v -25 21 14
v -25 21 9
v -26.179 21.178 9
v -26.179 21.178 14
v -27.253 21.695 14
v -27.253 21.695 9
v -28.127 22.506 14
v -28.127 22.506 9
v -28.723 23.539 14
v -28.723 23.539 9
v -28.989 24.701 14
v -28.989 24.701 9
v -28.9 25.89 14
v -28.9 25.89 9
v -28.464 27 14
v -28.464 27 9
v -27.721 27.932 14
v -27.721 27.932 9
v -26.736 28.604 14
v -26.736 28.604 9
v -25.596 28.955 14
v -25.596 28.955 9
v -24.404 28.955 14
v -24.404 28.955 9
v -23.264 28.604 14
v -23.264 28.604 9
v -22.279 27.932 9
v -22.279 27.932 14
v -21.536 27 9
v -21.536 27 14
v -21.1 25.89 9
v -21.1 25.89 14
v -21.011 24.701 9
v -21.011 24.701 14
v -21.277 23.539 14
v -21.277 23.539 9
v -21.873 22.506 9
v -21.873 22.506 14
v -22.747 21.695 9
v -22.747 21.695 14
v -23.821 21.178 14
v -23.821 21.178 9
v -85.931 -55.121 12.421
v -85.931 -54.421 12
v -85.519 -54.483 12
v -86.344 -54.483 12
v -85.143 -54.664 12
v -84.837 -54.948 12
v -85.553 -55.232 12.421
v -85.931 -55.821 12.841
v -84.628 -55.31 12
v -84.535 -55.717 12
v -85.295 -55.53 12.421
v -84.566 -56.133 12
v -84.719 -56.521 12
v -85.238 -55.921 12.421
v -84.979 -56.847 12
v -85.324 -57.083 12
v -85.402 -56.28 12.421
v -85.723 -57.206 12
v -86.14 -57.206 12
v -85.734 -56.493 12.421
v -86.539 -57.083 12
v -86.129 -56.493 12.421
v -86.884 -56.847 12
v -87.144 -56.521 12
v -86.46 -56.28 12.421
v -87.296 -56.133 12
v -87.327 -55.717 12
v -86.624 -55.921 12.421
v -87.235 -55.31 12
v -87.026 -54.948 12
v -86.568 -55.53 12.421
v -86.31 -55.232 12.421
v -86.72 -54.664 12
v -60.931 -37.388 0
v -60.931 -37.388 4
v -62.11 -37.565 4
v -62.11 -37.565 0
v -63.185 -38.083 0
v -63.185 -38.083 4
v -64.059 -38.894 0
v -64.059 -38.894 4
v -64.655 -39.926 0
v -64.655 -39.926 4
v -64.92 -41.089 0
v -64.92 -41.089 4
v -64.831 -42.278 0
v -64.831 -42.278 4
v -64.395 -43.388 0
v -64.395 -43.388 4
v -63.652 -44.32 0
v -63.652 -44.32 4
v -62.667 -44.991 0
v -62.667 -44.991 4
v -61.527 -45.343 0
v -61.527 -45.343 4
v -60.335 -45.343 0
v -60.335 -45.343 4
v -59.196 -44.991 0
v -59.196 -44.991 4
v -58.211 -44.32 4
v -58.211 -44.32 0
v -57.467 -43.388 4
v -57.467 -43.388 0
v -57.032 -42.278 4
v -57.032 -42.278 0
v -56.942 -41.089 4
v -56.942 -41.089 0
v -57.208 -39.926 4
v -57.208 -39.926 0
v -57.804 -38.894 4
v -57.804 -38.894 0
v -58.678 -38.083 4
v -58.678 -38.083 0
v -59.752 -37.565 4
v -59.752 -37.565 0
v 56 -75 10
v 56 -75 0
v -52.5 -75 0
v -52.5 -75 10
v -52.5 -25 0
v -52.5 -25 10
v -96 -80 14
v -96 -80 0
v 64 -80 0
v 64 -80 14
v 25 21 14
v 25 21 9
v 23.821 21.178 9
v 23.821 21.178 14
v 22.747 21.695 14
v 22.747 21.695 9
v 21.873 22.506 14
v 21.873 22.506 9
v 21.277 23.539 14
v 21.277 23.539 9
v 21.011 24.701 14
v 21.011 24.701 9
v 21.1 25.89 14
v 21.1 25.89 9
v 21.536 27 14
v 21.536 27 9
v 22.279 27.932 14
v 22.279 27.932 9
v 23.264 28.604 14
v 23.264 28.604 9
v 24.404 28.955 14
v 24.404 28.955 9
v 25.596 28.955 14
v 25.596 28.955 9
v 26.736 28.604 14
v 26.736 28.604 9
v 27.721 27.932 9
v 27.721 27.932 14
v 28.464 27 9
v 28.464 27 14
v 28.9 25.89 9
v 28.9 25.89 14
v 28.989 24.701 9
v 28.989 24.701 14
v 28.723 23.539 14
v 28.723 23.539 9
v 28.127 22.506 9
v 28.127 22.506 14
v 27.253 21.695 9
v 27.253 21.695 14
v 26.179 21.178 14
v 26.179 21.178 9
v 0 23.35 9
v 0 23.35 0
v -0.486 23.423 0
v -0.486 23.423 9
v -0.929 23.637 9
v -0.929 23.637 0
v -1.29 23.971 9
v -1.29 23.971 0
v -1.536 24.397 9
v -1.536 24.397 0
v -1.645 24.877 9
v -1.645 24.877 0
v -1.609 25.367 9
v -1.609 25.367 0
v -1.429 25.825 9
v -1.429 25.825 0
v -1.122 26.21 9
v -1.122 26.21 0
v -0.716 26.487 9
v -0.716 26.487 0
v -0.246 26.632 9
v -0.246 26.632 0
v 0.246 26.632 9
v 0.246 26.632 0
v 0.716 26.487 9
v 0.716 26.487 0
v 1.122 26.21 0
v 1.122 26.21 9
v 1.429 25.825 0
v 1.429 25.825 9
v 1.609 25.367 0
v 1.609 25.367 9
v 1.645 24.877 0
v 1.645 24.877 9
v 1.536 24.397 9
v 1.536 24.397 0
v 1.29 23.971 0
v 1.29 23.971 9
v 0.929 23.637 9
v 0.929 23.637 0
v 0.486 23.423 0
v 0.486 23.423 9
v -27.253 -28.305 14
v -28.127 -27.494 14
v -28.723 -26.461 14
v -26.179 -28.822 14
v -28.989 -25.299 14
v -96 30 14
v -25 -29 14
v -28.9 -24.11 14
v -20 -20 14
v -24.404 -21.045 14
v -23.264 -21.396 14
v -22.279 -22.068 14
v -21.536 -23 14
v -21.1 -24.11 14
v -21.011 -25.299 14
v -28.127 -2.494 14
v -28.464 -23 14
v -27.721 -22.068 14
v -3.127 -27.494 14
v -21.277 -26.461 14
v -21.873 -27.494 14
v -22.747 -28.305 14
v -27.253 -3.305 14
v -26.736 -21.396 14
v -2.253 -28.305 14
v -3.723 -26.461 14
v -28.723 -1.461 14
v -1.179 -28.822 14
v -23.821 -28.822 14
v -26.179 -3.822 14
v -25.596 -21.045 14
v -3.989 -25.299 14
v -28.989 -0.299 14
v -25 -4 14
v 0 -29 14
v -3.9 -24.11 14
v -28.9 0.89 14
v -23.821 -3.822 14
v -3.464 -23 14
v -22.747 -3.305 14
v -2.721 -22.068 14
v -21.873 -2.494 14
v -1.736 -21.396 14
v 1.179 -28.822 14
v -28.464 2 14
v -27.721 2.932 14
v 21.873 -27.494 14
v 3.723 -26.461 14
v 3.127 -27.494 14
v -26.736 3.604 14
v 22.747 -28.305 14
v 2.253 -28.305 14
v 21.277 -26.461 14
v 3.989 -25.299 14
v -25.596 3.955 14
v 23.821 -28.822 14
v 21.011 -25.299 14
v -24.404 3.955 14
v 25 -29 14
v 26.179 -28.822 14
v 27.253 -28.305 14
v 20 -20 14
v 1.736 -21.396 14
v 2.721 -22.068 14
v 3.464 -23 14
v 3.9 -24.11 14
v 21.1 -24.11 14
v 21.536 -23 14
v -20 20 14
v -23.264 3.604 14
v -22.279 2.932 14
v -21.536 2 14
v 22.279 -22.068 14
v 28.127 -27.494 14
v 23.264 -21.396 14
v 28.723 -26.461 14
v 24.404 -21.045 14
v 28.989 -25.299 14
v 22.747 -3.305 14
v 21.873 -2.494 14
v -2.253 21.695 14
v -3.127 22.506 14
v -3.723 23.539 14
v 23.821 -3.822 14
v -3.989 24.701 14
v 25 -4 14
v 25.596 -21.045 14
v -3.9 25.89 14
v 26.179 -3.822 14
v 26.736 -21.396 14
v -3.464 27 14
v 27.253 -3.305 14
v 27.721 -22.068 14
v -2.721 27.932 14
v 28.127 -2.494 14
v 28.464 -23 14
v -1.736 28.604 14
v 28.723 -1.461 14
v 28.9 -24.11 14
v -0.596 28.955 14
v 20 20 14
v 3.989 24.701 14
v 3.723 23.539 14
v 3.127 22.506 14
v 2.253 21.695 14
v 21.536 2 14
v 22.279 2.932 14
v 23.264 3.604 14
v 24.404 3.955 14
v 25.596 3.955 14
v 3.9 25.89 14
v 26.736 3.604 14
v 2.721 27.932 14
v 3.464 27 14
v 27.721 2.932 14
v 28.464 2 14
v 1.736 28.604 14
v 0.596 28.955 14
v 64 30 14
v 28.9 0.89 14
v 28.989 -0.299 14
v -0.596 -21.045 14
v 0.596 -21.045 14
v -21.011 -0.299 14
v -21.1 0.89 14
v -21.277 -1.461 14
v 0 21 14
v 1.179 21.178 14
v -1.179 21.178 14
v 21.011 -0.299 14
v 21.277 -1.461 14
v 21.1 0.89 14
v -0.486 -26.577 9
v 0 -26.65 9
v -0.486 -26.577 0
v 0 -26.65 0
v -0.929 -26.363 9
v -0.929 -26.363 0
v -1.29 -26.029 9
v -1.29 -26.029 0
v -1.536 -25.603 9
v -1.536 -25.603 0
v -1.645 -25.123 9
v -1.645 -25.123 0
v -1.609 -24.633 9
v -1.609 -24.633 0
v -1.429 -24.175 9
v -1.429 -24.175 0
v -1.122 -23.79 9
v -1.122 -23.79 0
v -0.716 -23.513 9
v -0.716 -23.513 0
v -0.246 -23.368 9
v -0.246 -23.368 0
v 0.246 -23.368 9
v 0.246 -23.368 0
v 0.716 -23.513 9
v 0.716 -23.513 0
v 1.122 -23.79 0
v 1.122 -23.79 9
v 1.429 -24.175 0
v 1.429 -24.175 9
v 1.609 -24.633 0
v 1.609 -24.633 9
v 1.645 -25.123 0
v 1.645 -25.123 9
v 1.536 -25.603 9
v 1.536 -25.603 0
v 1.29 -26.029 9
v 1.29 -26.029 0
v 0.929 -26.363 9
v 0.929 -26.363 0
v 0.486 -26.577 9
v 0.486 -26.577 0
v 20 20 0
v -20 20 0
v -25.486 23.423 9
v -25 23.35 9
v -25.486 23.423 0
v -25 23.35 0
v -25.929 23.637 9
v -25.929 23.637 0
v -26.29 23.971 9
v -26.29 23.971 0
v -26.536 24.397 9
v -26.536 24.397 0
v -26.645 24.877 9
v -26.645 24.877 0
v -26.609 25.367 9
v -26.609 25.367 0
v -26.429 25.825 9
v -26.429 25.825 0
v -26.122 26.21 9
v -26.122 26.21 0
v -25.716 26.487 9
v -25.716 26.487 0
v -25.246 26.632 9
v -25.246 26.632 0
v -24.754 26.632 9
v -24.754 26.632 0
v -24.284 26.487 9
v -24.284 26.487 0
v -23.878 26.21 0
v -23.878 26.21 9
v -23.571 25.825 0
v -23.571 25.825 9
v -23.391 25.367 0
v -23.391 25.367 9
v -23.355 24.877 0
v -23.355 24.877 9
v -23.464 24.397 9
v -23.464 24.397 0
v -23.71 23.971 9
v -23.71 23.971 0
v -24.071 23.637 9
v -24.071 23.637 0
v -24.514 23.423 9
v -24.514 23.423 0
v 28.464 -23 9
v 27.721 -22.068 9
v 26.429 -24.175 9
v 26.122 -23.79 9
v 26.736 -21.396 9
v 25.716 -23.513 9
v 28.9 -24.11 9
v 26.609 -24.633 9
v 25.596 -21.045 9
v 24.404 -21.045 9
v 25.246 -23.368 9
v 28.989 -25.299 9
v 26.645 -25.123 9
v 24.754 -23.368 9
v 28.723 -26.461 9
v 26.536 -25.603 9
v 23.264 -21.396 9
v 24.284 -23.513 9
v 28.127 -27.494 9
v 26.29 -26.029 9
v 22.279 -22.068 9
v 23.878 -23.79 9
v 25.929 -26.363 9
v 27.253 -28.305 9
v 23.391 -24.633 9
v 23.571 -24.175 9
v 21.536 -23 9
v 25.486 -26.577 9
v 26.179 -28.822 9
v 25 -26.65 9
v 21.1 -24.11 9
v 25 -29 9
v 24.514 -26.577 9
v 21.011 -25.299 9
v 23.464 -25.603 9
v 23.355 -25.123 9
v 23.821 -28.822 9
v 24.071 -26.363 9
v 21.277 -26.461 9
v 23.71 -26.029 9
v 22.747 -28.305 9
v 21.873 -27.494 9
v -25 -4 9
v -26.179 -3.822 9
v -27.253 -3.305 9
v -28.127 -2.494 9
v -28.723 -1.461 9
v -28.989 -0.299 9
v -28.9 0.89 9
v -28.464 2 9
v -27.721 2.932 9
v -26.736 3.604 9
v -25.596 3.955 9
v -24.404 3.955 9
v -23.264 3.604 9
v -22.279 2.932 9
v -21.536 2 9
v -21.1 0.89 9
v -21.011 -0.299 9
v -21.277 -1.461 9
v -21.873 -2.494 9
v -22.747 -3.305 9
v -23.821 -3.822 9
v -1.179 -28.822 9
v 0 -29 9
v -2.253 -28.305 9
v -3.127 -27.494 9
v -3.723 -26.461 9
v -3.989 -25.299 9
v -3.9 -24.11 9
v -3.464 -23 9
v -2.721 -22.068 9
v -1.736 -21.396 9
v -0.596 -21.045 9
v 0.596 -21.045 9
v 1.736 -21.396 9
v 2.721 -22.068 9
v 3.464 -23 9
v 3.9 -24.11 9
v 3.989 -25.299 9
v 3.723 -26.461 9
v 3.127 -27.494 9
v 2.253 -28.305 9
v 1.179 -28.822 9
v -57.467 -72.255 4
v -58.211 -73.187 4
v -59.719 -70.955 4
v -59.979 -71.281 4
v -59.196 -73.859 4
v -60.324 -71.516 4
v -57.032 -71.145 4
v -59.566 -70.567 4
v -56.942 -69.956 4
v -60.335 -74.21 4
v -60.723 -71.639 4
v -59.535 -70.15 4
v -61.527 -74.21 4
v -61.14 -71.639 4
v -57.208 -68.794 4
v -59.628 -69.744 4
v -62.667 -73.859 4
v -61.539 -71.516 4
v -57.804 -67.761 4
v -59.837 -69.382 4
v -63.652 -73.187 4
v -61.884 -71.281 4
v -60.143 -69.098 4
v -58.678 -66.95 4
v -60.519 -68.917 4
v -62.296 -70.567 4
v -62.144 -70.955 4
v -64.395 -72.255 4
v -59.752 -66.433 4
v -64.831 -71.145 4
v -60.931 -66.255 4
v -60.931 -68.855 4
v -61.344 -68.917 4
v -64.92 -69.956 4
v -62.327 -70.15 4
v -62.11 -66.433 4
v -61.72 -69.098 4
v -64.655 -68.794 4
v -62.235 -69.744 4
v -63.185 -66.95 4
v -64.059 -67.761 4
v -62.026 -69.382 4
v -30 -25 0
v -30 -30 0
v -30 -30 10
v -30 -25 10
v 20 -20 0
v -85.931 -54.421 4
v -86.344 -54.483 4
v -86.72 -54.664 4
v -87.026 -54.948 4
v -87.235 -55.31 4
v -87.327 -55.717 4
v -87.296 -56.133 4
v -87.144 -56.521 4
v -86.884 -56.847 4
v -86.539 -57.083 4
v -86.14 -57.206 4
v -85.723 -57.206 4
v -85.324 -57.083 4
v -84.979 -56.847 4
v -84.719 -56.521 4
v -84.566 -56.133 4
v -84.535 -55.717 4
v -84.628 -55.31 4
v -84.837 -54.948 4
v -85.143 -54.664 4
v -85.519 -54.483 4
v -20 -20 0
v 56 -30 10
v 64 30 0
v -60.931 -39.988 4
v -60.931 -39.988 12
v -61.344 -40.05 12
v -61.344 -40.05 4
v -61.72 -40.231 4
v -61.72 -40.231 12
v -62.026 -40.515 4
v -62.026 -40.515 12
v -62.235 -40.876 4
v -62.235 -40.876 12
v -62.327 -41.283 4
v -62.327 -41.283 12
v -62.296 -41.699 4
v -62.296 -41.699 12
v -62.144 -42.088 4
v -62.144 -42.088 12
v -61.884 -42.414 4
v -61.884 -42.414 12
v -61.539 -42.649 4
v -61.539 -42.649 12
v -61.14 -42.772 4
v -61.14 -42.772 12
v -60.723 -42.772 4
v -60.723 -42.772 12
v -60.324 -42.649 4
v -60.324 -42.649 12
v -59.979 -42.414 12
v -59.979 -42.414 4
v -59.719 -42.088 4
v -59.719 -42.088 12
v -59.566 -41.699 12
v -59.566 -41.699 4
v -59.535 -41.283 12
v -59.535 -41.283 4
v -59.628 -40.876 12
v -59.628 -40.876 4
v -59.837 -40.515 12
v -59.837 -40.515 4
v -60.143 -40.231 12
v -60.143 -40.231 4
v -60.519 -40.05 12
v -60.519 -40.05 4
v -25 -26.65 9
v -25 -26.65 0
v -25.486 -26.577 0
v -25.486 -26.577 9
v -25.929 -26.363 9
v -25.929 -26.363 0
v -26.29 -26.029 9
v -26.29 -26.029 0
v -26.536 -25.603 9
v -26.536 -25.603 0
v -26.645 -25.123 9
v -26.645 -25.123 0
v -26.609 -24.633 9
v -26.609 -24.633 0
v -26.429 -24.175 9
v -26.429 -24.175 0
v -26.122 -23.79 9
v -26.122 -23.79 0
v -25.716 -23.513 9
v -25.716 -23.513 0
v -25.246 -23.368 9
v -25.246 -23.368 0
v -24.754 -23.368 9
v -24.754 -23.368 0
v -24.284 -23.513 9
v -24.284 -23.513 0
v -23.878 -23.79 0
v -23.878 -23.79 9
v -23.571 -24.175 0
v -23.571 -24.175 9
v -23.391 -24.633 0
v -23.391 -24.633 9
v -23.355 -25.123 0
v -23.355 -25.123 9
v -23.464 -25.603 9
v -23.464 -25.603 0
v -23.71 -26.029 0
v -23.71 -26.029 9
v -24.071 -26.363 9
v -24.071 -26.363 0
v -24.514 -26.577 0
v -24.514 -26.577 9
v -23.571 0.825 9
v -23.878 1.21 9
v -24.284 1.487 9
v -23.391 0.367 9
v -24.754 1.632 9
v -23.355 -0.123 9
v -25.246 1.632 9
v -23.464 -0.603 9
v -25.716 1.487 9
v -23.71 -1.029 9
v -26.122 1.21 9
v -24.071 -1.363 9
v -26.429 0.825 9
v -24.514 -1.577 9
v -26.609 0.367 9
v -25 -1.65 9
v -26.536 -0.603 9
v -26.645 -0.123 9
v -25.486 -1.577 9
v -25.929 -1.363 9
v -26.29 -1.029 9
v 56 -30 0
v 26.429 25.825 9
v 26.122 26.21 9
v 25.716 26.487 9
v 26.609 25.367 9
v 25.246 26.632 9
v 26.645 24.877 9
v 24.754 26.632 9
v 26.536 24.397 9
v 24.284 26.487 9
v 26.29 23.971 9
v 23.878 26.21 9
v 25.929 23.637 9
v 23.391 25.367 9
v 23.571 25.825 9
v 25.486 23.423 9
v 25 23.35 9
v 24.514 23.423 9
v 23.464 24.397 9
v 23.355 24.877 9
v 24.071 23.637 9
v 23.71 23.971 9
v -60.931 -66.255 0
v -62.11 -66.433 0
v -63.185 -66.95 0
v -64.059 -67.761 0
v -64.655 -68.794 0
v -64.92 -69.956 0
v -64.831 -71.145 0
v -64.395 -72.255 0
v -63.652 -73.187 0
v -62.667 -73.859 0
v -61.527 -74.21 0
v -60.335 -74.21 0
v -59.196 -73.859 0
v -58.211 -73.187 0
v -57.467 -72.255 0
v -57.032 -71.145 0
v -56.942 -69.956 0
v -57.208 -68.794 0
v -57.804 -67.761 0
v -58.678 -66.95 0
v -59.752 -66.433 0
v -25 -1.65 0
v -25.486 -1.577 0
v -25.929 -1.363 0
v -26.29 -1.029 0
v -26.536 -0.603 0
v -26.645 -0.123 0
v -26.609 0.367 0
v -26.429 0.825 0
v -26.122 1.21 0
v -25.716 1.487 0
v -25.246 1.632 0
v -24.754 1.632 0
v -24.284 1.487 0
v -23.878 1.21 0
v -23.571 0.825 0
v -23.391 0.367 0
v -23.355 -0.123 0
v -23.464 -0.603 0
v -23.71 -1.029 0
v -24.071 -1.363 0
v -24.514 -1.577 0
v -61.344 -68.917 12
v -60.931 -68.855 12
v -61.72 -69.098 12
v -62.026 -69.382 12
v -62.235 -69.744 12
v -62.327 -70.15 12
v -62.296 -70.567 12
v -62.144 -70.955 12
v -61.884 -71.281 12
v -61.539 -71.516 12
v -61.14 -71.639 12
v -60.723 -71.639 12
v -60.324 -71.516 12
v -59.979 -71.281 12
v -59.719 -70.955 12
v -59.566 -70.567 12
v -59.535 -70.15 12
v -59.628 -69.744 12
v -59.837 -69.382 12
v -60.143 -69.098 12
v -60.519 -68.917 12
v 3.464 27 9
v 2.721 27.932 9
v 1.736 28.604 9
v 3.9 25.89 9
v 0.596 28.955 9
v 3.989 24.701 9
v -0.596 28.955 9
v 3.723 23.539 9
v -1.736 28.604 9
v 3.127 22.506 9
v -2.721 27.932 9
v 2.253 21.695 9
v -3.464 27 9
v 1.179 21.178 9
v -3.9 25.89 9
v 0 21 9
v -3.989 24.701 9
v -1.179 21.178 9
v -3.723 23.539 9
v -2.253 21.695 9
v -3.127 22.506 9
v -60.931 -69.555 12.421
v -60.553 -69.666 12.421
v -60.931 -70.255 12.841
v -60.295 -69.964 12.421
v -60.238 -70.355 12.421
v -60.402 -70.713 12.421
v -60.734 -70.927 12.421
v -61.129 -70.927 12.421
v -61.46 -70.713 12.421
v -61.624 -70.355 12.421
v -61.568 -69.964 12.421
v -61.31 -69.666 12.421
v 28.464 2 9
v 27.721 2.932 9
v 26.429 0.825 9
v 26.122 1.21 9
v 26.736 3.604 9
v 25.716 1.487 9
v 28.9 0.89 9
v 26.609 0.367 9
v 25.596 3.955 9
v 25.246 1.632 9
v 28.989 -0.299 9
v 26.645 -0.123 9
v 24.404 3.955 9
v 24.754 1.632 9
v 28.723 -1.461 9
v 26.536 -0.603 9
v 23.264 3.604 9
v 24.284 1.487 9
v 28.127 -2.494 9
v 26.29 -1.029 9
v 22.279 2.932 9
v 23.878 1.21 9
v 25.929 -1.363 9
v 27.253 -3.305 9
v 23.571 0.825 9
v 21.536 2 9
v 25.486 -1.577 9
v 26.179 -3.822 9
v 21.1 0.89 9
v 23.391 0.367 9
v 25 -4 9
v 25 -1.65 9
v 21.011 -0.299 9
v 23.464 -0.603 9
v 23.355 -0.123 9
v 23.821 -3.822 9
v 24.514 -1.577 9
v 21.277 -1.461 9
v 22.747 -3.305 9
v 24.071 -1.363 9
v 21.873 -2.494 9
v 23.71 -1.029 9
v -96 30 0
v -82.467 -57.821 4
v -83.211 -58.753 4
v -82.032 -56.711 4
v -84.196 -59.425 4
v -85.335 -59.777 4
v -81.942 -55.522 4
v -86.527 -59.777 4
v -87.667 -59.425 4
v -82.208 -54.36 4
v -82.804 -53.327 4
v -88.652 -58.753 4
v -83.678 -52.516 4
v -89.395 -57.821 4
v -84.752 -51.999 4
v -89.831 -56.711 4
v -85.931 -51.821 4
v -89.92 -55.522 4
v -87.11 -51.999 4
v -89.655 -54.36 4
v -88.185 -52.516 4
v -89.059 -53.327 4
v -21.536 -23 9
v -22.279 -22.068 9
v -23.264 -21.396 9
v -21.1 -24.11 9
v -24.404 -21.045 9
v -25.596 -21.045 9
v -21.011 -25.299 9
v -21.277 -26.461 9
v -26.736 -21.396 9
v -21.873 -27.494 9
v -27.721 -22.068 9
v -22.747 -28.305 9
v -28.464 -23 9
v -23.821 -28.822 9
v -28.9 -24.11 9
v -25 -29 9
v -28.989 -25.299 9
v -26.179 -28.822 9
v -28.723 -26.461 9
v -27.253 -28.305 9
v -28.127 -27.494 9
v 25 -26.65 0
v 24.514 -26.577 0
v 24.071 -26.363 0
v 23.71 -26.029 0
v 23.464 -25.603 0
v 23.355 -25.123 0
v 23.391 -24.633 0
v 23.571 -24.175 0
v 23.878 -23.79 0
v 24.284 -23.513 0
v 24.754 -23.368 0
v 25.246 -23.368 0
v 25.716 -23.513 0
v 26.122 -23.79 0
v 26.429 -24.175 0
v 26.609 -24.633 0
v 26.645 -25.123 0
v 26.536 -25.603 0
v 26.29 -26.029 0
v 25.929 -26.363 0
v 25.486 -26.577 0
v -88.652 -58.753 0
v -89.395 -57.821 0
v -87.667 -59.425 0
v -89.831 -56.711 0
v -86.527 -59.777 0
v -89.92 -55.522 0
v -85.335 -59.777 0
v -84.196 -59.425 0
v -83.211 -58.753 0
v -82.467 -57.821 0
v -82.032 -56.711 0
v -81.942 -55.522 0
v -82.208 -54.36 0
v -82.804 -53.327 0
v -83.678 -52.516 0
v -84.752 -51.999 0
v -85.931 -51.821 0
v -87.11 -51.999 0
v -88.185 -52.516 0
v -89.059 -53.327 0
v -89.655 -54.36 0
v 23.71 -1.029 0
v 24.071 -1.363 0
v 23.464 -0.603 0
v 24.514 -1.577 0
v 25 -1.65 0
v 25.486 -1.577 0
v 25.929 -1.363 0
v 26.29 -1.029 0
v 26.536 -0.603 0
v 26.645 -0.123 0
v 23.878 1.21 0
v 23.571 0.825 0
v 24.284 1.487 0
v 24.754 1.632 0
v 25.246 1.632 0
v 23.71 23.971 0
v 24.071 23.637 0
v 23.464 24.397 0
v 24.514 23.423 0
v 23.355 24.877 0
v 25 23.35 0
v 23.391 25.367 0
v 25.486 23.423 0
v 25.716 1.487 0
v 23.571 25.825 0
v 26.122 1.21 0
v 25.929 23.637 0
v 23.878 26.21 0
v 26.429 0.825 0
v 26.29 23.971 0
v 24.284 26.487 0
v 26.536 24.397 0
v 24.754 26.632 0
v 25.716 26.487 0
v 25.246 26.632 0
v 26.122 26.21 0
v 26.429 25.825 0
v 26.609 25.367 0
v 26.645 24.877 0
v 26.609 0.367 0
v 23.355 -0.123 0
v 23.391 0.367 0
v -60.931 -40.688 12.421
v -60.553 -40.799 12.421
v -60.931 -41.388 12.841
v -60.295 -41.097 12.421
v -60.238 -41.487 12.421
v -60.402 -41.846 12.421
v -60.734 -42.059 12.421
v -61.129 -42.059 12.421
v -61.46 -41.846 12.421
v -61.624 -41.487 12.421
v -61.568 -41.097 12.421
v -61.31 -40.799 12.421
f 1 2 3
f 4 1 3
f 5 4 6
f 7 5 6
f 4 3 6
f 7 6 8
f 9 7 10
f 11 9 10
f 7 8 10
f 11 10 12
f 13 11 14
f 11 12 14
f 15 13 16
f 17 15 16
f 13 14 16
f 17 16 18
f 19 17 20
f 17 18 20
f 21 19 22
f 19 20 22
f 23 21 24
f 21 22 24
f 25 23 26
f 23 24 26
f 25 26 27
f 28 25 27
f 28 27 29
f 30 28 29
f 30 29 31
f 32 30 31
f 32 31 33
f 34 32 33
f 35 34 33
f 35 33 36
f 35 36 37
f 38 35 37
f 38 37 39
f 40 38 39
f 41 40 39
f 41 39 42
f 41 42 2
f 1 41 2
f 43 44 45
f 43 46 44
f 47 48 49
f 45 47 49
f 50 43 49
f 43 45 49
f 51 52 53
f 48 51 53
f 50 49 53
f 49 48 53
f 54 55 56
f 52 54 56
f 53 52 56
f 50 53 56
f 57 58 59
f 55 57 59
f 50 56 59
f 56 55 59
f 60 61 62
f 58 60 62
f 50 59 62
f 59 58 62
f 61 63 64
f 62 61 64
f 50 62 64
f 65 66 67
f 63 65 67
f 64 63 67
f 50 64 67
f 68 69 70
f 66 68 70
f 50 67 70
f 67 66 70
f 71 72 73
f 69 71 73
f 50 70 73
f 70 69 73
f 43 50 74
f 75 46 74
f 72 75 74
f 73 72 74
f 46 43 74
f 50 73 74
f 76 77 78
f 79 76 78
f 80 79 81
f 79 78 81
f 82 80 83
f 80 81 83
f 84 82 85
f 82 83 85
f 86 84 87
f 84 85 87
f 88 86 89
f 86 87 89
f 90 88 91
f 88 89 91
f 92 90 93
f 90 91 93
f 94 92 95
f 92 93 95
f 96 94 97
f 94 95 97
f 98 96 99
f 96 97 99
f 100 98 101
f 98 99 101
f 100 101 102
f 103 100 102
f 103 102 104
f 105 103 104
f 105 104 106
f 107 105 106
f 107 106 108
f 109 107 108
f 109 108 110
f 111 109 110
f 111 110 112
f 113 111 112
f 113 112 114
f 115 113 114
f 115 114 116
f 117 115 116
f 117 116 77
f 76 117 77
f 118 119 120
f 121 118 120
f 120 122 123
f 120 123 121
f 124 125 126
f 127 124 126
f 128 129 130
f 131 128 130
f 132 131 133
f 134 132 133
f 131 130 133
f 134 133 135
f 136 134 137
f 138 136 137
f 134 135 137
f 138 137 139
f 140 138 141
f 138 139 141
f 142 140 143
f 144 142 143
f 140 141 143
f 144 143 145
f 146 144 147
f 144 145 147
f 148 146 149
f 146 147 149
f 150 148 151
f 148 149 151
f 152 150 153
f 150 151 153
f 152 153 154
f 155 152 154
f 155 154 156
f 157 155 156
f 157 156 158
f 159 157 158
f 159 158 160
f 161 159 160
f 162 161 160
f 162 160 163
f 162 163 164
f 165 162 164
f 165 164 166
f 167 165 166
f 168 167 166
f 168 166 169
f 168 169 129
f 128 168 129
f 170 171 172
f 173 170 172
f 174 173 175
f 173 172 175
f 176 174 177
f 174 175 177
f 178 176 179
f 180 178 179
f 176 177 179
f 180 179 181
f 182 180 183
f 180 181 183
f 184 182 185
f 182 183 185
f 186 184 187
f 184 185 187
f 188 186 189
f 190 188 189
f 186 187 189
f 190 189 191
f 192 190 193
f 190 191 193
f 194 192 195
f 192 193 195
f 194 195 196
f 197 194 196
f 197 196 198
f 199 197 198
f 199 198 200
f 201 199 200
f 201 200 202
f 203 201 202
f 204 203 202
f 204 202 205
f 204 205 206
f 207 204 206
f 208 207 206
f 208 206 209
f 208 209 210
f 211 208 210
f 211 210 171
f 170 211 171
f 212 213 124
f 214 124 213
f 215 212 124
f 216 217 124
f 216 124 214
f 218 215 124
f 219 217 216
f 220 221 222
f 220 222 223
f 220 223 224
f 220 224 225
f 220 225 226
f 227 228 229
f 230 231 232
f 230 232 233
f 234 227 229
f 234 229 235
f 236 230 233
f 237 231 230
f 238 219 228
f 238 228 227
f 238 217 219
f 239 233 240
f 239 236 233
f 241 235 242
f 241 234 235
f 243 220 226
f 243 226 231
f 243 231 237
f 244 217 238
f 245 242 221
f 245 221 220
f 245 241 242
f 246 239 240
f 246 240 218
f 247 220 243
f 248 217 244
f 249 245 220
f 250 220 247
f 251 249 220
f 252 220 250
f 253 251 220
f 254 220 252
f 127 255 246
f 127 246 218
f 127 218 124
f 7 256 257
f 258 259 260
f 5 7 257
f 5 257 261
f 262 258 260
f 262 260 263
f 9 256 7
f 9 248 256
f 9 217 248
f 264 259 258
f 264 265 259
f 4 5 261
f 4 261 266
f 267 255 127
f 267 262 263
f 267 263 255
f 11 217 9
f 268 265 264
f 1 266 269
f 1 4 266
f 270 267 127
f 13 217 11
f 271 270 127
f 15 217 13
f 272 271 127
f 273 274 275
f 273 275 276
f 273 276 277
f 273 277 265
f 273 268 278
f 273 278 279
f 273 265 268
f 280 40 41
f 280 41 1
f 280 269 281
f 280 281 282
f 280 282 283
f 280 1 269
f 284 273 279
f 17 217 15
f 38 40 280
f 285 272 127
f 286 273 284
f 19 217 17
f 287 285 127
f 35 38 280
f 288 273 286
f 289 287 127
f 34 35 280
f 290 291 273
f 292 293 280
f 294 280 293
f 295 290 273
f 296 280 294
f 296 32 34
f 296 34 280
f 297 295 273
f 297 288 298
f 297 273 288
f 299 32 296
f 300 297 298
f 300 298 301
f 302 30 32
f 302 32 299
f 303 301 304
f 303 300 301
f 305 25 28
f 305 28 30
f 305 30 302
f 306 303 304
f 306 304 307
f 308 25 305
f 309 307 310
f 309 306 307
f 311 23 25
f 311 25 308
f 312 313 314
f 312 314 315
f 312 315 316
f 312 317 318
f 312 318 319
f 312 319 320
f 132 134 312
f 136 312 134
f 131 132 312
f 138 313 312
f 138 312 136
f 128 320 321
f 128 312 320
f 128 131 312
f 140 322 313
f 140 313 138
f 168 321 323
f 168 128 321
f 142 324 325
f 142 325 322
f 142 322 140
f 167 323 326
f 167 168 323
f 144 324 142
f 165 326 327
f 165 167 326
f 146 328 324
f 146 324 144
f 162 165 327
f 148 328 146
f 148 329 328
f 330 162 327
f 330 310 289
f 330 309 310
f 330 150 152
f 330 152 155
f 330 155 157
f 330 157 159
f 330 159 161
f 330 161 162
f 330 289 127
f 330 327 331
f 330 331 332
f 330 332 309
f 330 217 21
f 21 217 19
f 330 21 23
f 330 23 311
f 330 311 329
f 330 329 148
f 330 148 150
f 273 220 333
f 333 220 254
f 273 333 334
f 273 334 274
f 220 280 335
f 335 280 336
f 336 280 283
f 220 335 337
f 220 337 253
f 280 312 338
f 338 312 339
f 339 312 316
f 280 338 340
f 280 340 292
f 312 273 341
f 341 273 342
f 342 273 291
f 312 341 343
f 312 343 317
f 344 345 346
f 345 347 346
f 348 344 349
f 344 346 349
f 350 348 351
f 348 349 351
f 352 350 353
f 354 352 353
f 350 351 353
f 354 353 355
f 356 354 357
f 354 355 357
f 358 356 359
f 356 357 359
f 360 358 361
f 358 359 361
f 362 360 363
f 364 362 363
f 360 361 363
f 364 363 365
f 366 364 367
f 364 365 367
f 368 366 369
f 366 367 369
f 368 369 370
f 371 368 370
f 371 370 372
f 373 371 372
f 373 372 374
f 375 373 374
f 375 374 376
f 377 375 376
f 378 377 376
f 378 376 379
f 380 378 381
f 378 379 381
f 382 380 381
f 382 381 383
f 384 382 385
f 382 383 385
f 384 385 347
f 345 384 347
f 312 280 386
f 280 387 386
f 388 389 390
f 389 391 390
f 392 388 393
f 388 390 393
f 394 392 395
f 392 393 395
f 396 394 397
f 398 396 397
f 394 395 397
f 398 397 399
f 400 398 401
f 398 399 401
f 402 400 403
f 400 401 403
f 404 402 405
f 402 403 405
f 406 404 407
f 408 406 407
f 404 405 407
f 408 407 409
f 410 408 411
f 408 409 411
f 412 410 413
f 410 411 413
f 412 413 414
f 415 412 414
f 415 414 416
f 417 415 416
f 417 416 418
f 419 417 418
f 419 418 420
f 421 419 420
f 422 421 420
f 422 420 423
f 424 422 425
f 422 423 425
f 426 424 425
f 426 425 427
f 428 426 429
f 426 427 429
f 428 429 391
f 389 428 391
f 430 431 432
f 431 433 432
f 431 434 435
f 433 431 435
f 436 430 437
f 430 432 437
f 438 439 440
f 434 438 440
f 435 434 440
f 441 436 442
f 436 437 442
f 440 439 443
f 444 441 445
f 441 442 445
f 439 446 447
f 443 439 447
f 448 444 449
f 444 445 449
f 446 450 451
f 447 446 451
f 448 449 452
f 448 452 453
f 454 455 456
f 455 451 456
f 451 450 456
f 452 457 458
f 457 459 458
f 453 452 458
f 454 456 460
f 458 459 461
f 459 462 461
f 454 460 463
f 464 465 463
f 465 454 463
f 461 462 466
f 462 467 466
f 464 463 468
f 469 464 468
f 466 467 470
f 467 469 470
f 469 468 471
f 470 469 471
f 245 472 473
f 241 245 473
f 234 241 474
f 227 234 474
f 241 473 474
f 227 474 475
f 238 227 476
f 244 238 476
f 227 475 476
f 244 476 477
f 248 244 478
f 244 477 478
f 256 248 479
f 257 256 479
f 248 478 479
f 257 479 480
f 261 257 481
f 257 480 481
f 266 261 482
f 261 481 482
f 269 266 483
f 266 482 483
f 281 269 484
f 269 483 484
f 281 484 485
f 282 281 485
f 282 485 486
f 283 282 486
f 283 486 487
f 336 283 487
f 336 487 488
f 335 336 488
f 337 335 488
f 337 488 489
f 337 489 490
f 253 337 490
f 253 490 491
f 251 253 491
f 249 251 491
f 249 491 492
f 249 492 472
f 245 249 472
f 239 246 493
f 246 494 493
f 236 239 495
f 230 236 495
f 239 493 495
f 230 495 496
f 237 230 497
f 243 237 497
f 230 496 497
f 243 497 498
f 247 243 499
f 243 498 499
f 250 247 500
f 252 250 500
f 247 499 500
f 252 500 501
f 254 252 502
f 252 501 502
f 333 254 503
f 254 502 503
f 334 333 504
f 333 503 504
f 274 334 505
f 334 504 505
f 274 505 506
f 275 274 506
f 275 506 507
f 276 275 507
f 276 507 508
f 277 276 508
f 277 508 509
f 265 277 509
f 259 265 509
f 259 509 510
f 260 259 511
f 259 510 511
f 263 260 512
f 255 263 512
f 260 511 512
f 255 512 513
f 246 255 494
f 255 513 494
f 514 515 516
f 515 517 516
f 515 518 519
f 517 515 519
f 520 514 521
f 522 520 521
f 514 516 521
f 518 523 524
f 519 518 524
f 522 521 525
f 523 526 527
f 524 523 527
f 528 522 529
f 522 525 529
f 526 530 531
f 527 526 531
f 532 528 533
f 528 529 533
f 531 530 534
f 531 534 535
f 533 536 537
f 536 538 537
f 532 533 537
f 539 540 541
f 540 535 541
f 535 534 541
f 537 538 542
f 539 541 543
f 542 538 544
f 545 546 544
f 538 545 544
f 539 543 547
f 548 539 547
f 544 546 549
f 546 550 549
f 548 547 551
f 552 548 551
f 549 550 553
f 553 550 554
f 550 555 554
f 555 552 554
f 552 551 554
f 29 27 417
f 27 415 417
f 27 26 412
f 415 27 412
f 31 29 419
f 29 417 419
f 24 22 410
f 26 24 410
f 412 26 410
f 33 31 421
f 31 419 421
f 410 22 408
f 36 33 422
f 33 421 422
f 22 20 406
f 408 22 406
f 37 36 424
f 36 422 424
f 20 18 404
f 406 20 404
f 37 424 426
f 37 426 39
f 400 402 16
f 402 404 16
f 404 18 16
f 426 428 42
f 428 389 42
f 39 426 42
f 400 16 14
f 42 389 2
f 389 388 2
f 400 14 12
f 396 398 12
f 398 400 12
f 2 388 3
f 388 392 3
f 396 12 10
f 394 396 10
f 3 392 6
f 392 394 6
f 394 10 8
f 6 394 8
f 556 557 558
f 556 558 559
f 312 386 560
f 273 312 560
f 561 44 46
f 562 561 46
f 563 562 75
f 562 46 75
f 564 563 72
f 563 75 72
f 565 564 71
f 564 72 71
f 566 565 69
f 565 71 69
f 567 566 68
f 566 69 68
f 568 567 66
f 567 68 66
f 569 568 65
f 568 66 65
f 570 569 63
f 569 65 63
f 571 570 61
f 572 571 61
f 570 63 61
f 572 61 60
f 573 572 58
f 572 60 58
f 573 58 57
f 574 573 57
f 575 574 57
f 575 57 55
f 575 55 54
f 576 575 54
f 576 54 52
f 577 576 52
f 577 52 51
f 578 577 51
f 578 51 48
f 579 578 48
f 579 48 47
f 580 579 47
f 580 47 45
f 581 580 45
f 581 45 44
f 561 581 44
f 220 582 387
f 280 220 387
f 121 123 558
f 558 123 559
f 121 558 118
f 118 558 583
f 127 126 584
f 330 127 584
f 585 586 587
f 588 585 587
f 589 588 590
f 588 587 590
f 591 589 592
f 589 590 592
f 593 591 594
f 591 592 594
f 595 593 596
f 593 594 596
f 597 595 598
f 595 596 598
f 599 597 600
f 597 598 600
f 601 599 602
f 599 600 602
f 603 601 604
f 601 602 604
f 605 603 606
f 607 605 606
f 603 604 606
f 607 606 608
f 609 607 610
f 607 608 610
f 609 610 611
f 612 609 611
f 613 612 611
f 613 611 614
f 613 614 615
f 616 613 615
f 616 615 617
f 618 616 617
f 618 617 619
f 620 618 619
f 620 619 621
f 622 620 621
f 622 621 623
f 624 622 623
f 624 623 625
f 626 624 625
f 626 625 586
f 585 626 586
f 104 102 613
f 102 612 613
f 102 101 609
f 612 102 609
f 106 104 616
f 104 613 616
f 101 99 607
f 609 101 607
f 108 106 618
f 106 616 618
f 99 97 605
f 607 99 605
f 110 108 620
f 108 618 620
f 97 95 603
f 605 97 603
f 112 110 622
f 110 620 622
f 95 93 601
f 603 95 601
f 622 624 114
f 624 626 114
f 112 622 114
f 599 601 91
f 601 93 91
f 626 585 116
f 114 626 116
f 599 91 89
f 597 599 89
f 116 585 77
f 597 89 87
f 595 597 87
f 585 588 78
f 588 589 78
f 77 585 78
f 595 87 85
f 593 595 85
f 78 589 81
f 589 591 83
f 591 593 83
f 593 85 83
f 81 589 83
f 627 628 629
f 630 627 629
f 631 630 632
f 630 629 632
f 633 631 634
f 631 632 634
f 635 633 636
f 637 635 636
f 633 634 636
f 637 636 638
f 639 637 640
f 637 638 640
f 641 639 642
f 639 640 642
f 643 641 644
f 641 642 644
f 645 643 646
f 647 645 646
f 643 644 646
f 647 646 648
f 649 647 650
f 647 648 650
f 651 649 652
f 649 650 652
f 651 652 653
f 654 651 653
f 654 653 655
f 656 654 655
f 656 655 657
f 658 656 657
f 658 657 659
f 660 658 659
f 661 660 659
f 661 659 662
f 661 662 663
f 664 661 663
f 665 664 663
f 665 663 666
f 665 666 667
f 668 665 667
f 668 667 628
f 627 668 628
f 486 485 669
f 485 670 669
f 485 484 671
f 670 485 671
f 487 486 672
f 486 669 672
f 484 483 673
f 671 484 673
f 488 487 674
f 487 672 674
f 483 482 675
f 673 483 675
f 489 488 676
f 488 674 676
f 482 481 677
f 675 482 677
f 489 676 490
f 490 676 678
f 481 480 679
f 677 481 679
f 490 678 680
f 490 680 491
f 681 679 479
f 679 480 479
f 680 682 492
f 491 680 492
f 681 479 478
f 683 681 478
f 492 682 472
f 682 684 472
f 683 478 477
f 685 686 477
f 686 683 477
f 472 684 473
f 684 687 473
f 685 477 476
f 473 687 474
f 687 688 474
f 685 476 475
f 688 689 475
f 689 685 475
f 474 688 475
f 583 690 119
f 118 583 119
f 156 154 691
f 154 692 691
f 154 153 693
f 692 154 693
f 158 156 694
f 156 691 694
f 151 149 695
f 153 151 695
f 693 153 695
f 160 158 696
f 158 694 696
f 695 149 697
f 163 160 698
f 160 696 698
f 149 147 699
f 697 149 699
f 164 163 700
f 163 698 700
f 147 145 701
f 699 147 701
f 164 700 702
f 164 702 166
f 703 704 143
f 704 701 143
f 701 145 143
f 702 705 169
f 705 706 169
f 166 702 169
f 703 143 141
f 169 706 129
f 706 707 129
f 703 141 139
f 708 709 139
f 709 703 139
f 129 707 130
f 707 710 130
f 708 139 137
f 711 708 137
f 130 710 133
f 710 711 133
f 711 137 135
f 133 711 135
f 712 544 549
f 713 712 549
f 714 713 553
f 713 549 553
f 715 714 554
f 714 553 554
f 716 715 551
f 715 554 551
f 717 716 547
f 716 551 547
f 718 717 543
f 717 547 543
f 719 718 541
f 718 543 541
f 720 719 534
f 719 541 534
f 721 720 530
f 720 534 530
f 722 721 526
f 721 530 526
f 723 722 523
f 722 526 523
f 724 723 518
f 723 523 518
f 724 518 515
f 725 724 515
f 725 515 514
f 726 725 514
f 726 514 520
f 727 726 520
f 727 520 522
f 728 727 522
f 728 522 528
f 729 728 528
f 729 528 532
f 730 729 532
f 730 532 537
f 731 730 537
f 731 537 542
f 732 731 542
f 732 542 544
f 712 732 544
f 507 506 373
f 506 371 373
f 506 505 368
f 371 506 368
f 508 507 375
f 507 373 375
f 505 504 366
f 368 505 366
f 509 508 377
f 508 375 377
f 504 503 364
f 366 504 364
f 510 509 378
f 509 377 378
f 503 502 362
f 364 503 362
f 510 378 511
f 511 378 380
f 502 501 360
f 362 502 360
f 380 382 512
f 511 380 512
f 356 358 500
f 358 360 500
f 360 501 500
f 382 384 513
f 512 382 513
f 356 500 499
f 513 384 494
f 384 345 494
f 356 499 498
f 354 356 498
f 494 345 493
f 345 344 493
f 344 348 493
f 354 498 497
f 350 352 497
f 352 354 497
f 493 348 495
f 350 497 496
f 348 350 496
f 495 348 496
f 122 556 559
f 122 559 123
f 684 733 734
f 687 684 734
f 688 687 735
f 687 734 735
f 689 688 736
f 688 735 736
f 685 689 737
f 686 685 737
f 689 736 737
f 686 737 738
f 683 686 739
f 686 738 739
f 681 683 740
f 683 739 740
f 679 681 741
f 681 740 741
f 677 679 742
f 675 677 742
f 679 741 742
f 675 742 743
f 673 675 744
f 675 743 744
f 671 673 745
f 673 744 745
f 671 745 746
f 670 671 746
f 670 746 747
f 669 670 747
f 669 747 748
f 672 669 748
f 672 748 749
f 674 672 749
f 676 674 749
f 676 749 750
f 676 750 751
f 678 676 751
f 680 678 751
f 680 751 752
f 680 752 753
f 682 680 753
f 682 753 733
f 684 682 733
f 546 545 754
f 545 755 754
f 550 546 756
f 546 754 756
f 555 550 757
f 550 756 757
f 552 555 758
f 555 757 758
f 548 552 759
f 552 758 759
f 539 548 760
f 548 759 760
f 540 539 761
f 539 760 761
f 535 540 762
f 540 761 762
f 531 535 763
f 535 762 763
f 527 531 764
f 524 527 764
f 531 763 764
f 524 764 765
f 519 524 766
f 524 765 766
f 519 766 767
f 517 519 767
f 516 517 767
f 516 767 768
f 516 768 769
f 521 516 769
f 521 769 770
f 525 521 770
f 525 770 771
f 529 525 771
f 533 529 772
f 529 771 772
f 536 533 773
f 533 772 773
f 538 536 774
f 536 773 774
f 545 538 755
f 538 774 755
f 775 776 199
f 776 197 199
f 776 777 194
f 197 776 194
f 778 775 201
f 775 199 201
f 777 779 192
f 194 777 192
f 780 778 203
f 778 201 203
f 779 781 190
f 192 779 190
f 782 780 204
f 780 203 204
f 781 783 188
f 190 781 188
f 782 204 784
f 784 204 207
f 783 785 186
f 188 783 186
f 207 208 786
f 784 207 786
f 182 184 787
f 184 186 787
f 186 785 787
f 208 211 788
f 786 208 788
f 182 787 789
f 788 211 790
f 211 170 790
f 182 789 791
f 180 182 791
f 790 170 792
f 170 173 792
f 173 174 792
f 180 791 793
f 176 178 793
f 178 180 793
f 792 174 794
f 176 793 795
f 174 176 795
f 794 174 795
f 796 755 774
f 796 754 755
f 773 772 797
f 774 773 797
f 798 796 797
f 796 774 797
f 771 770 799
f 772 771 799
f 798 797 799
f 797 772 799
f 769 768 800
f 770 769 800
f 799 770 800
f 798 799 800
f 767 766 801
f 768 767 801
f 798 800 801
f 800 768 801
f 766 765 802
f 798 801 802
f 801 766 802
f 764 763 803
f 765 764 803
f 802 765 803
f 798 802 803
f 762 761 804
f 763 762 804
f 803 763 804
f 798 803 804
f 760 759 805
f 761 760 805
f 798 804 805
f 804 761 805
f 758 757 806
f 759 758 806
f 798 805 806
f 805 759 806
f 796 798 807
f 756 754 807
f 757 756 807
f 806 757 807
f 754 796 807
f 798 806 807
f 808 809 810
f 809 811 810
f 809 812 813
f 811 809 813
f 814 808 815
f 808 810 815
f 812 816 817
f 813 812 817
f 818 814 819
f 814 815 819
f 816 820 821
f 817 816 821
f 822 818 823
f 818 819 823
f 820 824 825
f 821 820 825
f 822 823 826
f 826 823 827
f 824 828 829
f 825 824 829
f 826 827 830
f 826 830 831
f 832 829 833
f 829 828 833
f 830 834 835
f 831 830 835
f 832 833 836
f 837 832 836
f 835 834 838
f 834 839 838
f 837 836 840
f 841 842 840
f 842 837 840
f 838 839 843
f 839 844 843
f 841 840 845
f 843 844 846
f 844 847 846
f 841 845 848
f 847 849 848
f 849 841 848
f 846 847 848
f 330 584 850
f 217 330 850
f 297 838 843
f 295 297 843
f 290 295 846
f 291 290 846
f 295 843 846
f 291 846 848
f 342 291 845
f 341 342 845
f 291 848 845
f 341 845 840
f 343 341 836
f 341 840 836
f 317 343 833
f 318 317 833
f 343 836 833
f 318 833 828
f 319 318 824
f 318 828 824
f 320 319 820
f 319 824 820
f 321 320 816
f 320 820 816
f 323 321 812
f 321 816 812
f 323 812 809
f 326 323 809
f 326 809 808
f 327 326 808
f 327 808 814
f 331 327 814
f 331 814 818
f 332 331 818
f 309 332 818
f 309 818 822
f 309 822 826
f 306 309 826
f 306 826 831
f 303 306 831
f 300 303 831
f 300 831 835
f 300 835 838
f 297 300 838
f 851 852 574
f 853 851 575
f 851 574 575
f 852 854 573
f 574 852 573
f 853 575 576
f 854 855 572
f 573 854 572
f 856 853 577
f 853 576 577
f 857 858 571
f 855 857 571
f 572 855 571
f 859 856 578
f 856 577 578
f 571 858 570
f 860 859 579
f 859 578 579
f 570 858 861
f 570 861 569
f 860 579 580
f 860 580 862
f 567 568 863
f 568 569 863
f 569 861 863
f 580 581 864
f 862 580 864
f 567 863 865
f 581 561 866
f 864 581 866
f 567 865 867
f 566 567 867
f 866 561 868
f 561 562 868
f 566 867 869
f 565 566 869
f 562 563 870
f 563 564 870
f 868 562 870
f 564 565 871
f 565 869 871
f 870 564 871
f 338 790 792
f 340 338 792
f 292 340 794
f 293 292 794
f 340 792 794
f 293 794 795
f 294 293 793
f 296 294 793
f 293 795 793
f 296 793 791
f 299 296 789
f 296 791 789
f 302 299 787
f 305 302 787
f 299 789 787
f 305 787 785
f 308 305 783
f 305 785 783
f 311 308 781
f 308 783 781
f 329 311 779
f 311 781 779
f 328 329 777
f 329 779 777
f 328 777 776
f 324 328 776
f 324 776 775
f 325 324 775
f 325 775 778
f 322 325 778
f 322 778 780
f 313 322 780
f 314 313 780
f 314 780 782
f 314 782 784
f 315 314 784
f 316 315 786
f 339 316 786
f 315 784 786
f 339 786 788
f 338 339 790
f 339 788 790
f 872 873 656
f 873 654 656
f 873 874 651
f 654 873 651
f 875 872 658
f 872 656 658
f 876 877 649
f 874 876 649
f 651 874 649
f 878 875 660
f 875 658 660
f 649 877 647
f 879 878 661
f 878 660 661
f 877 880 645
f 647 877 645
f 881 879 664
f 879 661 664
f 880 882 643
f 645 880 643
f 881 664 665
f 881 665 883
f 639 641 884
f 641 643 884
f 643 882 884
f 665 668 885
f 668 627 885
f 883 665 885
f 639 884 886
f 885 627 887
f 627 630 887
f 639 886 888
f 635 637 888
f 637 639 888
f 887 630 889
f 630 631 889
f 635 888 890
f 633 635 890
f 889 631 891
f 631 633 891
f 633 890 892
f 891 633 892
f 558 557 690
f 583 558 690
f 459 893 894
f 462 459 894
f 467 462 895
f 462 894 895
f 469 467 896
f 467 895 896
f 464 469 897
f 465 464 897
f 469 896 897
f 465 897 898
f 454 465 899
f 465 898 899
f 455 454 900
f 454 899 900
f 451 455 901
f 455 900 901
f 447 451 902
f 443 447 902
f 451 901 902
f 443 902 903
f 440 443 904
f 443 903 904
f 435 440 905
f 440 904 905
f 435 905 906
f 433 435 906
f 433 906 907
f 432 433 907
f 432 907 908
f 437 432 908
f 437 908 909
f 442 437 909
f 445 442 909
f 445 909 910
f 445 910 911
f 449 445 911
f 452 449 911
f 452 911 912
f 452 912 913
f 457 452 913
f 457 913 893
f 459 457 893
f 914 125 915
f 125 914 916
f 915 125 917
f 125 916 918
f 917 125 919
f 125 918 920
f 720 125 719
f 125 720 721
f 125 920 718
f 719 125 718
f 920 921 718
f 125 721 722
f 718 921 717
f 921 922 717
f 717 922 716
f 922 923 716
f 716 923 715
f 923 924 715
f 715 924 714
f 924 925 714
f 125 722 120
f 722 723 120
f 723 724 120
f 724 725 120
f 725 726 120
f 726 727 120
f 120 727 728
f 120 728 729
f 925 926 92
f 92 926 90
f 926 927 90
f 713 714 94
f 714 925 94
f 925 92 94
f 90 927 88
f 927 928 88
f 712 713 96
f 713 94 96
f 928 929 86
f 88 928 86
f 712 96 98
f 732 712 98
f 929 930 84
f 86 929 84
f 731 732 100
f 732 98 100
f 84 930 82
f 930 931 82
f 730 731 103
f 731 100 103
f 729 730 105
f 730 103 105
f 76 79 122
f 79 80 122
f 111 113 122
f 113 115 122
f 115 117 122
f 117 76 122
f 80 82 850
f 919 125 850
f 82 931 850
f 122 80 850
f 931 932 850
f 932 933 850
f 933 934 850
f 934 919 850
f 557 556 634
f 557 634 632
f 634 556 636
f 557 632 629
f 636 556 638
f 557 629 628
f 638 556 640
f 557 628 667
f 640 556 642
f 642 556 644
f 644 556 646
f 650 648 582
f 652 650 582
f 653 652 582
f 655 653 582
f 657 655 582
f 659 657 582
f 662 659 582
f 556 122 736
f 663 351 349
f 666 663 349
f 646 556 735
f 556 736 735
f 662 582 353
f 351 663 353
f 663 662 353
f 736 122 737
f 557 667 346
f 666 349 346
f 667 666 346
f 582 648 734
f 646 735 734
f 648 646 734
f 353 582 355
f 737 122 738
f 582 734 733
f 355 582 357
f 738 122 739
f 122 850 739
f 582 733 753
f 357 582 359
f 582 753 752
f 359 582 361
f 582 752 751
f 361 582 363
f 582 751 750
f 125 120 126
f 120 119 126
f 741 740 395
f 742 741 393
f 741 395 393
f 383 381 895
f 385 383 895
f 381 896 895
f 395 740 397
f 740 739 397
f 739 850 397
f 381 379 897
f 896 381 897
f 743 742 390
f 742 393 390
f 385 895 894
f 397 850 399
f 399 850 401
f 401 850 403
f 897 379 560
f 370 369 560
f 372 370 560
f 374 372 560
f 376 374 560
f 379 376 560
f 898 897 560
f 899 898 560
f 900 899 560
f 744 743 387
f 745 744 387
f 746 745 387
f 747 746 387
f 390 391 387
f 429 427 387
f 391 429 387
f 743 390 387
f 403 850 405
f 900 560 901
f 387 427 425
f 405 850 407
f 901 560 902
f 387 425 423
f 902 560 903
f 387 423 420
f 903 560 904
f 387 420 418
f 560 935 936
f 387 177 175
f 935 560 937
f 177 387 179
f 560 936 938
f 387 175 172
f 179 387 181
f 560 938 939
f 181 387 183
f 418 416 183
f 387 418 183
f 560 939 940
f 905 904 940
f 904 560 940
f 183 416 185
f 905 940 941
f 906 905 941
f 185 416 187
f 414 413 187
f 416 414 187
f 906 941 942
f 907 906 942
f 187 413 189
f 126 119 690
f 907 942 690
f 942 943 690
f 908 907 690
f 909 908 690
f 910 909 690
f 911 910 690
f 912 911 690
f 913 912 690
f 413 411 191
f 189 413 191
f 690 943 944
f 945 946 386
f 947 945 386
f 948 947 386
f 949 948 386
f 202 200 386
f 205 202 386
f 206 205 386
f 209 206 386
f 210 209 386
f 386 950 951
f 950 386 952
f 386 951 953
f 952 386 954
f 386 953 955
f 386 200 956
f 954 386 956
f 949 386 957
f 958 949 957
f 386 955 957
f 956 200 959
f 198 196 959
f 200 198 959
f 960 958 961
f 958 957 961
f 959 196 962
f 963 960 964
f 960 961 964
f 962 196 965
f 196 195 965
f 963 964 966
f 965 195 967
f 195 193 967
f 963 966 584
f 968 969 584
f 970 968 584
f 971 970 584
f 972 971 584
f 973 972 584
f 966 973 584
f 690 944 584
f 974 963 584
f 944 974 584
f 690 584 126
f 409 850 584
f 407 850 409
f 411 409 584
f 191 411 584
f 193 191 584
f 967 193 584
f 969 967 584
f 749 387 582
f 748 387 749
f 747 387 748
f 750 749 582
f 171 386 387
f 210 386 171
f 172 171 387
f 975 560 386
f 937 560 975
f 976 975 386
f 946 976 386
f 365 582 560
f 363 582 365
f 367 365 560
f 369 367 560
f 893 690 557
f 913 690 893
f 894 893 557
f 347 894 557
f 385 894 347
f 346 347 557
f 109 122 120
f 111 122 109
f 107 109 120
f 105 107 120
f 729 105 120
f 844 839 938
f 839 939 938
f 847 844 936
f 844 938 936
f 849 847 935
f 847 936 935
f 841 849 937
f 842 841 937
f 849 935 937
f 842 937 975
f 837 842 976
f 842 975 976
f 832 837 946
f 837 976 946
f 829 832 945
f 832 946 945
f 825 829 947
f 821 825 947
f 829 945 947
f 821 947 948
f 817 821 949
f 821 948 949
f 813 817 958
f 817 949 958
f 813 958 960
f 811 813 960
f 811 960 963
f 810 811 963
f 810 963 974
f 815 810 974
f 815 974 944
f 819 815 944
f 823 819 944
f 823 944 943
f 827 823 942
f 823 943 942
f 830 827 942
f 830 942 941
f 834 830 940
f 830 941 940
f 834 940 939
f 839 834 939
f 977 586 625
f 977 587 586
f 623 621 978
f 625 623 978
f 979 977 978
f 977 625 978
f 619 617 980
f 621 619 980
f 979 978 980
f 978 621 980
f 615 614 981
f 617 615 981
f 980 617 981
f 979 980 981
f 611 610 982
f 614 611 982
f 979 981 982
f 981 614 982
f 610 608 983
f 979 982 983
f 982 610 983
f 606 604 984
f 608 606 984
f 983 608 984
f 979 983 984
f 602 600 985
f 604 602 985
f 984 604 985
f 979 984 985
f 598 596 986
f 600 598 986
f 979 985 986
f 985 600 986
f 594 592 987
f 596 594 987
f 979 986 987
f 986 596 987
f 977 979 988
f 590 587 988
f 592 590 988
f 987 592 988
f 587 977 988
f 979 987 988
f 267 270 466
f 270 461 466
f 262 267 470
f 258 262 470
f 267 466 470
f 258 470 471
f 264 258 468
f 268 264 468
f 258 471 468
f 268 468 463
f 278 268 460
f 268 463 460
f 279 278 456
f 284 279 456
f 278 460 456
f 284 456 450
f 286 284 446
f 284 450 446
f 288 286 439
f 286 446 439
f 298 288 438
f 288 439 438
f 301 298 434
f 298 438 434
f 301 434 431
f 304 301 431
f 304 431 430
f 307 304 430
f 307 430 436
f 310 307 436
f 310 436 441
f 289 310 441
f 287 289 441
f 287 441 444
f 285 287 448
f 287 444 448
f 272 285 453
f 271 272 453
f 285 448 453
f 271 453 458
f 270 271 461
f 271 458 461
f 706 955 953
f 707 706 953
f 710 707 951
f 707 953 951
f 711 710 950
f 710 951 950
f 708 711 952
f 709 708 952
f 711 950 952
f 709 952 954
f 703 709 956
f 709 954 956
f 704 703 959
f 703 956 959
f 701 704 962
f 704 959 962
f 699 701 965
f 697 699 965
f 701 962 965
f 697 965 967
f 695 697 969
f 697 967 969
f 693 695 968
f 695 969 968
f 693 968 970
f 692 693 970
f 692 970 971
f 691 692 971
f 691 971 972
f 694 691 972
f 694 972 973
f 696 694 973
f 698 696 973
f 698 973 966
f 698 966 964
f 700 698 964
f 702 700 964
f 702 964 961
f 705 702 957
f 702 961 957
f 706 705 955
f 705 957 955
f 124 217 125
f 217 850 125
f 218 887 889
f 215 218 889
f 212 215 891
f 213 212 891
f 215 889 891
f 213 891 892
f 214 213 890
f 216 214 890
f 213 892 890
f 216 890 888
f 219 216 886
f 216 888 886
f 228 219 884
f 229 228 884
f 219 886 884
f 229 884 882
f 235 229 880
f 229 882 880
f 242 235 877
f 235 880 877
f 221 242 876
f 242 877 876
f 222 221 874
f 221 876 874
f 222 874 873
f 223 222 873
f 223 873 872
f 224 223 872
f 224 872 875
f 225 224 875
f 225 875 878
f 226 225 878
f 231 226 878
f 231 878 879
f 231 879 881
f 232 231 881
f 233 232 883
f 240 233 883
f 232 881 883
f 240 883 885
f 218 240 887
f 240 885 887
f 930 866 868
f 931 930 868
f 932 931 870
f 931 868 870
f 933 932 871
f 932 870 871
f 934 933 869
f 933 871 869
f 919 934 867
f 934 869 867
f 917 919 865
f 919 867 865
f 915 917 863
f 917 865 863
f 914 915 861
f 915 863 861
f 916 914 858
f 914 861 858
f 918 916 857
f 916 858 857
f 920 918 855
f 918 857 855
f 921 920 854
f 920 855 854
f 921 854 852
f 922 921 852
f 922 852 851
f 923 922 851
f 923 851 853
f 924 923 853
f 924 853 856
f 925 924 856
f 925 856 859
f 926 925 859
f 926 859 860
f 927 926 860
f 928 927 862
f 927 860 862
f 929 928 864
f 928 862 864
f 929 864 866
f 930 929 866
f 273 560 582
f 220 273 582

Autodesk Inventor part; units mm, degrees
ref_plane "YZ Plane" through (0, 0, 0) normal (1, 0, 0) x (0, 1, 0)
ref_plane "XZ Plane" through (0, 0, 0) normal (0, 1, 0) x (-1, 0, 0)
ref_plane "XY Plane" through (0, 0, 0) normal (0, 0, 1) x (1, 0, 0)
ref_plane "Work Plane1" through (0, 0, 0) normal (0, 0, 1) x (1, 0, 0)
sketch "Sketch1" plane through (0, 0, 0) normal (0, 0, 1) x (1, 0, 0)
  circle A0 centre (0, 25) radius 1.95 construction
  circle A1 centre (-25, 0) radius 1.95 construction
  circle A2 centre (-25, -25) radius 1.95 construction
  circle A3 centre (25, 25) radius 1.95 construction
  circle A4 centre (25, -25) radius 1.95 construction
  circle A5 centre (-25, 25) radius 1.95 construction
  circle A6 centre (25, 0) radius 1.95 construction
  circle A7 centre (0, -25) radius 1.95 construction
  line L0 (-28, 30) -> (-30, 28) construction
  line L1 (-30, 28) -> (-30, -28) construction
  line L2 (-30, -28) -> (-28, -30) construction
  line L3 (-28, -30) -> (28, -30) construction
  line L4 (28, -30) -> (30, -28) construction
  line L5 (30, -28) -> (30, 28) construction
  line L6 (30, 28) -> (28, 30) construction
  line L7 (28, 30) -> (-28, 30) construction
  circle A8 centre (35, -56) radius 1 construction
  circle A9 centre (5, -48.5) radius 1 construction
  circle A10 centre (5, -64.5) radius 1.0474 construction
  circle A11 centre (-5, -64.5) radius 1 construction
  circle A12 centre (-5, -56) radius 1 construction
  circle A13 centre (-5, -48.5) radius 1 construction
  circle A14 centre (5, -56) radius 1 construction
  circle A15 centre (35, -48) radius 1 construction
  circle A16 centre (35, -64) radius 1 construction
  line L8 (38, -40) -> (38, -72) construction
  line L9 (38, -40) -> (-10, -40) construction
  line L10 (-10, -72) -> (-10, -40) construction
  line L11 (38, -72) -> (-10, -72) construction
  line L12 (38, -71) -> (38, -41) construction
  line L13 (38, -71) -> (48, -71) construction
  line L14 (48, -41) -> (48, -71) construction
  line L15 (38, -41) -> (48, -41) construction
  line L16 (56, -75) -> (-52.5, -75)
  line L17 (-52.5, -75) -> (-52.5, -30)
  line L18 (-52.5, -30) -> (56, -30)
  line L19 (56, -30) -> (56, -75)
  line L20 (-40, -41.1445) -> (-40, -68) construction
  line L21 (-41, -39.0927) -> (-41, -47.7587) construction
  line L22 (-41, -39.0927) -> (-46.5, -39.0927) construction
  line L23 (-46.5, -47.7587) -> (-46.5, -39.0927) construction
  line L24 (-41, -47.7587) -> (-46.5, -47.7587) construction
  line L25 (-41, -60.5) -> (-41, -64) construction
  line L26 (-41, -60.5) -> (-46.5, -60.5) construction
  line L27 (-46.5, -64) -> (-46.5, -60.5) construction
  line L28 (-41, -64) -> (-46.5, -64) construction
  line L29 (64, 30) -> (-96, 30)
  line L30 (-96, 30) -> (-96, -80)
  line L31 (-96, -80) -> (64, -80)
  line L32 (64, -80) -> (64, 30)
  line L33 (20, -20) -> (-20, -20)
  line L34 (-20, -20) -> (-20, 20)
  line L35 (-20, 20) -> (20, 20)
  line L36 (20, 20) -> (20, -20)
  line L37 (20, -20) -> (-20, 20) construction
  line L38 (-20, -20) -> (20, 20) construction
  line L39 (-52.5, -30) -> (-30, -30)
  line L40 (-30, -30) -> (-30, -25)
  line L41 (-30, -25) -> (-52.5, -25)
  line L42 (-52.5, -25) -> (-52.5, -30)
  point P0 (0, 0)
  dimension "d1" = 3
  dimension "d2" = 8
  dimension "d4" = 6
  dimension "d5" = 160
  dimension "d6" = 110
  dimension "d7" = 8
  dimension "d19" = 40
  dimension "d20" = 40
  dimension "d28" = 5
  dimension "d29" = 0
extrude "Extrusion1" add sketch "Sketch1" along normal blind 10
sketch "Sketch2" plane through (0, 0, 10) normal (0, 0, 1) x (1, 0, 0)
  line L0 (-30, -30) -> (56, -30) projected
  line L1 (56, -30) -> (56, -75) projected
  line L2 (56, -75) -> (-52.5, -75) projected
  line L3 (64, 30) -> (-96, 30) projected
  line L4 (-96, 30) -> (-96, -80) projected
  line L5 (-96, -80) -> (64, -80) projected
  line L6 (64, -80) -> (64, 30) projected
  line L7 (20, -20) -> (20, 20) projected
  line L8 (-20, -20) -> (20, -20)
  line L9 (20, -20) -> (20, 20)
  line L10 (20, 20) -> (-20, 20)
  line L11 (-20, 20) -> (-20, -20)
  line L12 (-20, -20) -> (20, 20) construction
  line L13 (20, -20) -> (-20, 20) construction
  line L14 (-52.5, -25) -> (-30, -25) projected
  line L15 (-30, -25) -> (-30, -30) projected
  line L16 (-52.5, -75) -> (-52.5, -25) projected
  point P0 (0, 0)
extrude "Extrusion2" add sketch "Sketch2" along normal blind 4 contours L0 L1 L2 L16 L14 L15 | L6 L5 L4 L3
sketch "Sketch3" plane through (0, 0, 14) normal (0, 0, 1) x (1, 0, 0)
  circle A0 centre (0, 25) radius 1.95 construction
  circle A1 centre (-25, 0) radius 1.95 construction
  circle A2 centre (-25, -25) radius 1.95 construction
  circle A3 centre (25, 25) radius 1.95 construction
  circle A4 centre (25, -25) radius 1.95 construction
  circle A5 centre (-25, 25) radius 1.95 construction
  circle A6 centre (25, 0) radius 1.95 construction
  circle A7 centre (0, -25) radius 1.95 construction
  line L0 (-28, 30) -> (-30, 28) construction
  line L1 (-30, 28) -> (-30, -28) construction
  line L2 (-30, -28) -> (-28, -30) construction
  line L3 (-28, -30) -> (28, -30) construction
  line L4 (28, -30) -> (30, -28) construction
  line L5 (30, -28) -> (30, 28) construction
  line L6 (30, 28) -> (28, 30) construction
  line L7 (28, 30) -> (-28, 30) construction
  point P0 (0, 0)
hole "Hole1" at (25, 25, 14) at (0, 25, 14) at (-25, 25, 14) at (-25, 0, 14) at (-25, -25, 14) at (0, -25, 14) at (25, -25, 14) at (25, 0, 14) direction (0, 0, -1) diameter 3.3 end through all counterbore diameter 8 counterbore depth 5
sketch "Sketch4" plane through (0, 0, 0) normal (0, 0, -1) x (-1, 0, 0)
  line L0 (52.5, -75) -> (-56, -75) construction
  line L1 (-56, -75) -> (-56, -30) construction
  line L2 (-56, -30) -> (30, -30) construction
  line L3 (20, 20) -> (20, -20) construction
  line L4 (20, -20) -> (-20, -20) construction
  line L5 (-20, -20) -> (-20, 20) construction
  line L6 (-20, 20) -> (20, 20) construction
  line L7 (-64, 30) -> (96, 30) construction
  line L8 (-64, -80) -> (-64, 30) construction
  line L9 (96, -80) -> (-64, -80) construction
  line L10 (96, 30) -> (96, -80) construction
  line L11 (60.9313, -70.255) -> (60.9313, -41.3875) construction
  line L12 (60.9313, -41.3875) -> (85.9313, -55.8212) construction
  line L13 (85.9313, -55.8212) -> (60.9313, -70.255) construction
  line L14 (96, 30) -> (96, -80) construction
  line L15 (30, -30) -> (30, -25) projected
  line L16 (30, -25) -> (52.5, -25) projected
  line L17 (52.5, -25) -> (52.5, -75) projected
  point P0 (0, 0)
  point P1 (69.2646, -55.8212)
  dimension "d30" = 25
hole "Hole2" at (-60.9313, -41.3875, 0) at (-85.9313, -55.8212, 0) at (-60.9313, -70.255, 0) direction (0, 0, 1) diameter 2.8 depth 12 tip angle 118 counterbore diameter 8 counterbore depth 4
properties part number "cellSTORM_Base_v0"
